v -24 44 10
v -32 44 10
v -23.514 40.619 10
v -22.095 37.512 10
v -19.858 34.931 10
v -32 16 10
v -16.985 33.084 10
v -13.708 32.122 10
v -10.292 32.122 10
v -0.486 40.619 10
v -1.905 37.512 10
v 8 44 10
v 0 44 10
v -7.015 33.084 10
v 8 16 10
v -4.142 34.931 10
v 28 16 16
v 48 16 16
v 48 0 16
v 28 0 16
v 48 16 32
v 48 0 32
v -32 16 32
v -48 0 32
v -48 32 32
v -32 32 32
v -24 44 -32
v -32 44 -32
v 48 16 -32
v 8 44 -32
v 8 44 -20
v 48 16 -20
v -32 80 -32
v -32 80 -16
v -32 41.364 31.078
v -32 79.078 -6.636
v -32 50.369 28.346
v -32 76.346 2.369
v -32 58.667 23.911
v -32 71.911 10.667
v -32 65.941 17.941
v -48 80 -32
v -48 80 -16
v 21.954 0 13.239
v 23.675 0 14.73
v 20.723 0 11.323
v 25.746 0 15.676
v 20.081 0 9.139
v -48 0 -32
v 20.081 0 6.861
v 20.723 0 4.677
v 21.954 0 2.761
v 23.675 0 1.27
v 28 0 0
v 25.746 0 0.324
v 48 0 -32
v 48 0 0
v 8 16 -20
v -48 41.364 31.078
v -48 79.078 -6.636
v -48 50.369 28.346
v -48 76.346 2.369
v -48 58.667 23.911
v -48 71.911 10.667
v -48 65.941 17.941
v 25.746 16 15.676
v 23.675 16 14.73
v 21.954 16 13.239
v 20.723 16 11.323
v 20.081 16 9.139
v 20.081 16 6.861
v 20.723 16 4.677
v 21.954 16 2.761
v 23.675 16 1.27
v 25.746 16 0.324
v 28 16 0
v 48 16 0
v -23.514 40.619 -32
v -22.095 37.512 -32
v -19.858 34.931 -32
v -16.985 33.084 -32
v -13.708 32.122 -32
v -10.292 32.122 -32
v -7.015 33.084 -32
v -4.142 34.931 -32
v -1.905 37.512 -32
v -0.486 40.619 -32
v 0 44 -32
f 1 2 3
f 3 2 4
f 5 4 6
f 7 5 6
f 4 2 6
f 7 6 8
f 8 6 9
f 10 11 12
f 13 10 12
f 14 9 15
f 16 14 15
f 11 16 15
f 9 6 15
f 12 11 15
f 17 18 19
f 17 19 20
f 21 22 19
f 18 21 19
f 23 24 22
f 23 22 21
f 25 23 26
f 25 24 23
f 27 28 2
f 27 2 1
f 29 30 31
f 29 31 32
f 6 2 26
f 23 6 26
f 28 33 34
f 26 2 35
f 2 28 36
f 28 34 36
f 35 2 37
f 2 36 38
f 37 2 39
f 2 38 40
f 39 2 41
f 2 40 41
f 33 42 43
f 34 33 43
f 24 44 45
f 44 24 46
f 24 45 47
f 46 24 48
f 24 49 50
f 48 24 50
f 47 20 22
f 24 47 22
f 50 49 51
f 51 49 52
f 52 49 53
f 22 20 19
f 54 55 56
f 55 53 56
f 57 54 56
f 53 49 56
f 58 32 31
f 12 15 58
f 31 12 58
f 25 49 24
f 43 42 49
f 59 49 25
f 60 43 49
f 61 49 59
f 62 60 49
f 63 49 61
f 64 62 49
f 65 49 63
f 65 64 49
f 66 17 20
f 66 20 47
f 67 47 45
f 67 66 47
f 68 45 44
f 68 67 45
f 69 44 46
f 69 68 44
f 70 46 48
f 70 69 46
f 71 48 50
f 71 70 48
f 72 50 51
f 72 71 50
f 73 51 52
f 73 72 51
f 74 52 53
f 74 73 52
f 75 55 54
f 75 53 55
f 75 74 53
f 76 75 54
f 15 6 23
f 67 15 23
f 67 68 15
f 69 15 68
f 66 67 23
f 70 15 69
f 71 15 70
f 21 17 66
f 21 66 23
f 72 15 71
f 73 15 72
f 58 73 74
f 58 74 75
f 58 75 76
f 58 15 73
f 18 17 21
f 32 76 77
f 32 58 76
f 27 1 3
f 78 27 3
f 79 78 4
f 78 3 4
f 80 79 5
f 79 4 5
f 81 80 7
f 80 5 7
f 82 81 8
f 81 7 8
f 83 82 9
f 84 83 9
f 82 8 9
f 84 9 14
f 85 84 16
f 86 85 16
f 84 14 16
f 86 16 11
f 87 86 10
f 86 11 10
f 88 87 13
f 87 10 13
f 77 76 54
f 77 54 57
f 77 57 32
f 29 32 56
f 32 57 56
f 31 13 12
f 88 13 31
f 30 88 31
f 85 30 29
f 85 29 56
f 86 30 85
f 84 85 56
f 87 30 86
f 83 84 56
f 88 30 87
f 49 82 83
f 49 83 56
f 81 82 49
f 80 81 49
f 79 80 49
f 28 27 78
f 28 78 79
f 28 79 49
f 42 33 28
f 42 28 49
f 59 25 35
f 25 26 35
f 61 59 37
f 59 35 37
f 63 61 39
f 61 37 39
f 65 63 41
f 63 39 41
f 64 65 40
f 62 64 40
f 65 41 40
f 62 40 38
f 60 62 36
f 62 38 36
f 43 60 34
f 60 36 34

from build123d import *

# Parameters (mm, degrees)
SKETCH1_W           = 96
SKETCH1_H           = 64
BOSS_EXTRUDE1_DEPTH = 16
SKETCH2_W           = 64
SKETCH2_H           = 64
BOSS_EXTRUDE2_DEPTH = 16
FILLET2_R           = 48
SKETCH3_W           = 40
SKETCH3_H           = 42
BOSS_EXTRUDE3_DEPTH = 28
SKETCH4_R           = 12
CUT_EXTRUDE1_DEPTH  = 103.313244499
CUT_EXTRUDE2_DEPTH  = 87.162636914
BOSS_EXTRUDE5_DEPTH = 12


with BuildPart() as part:
    # Sketch1 → Boss-Extrude1 (new body)
    with BuildSketch(Plane(origin=(0, 0, 0), x_dir=(1, 0, 0), z_dir=(0, 1, 0))):
        Rectangle(SKETCH1_W, SKETCH1_H)
    extrude(amount=BOSS_EXTRUDE1_DEPTH)

    # Sketch2 → Boss-Extrude2 (add)
    with BuildSketch(Plane.ZY.offset(48)):
        with Locations((0, 48)):
            Rectangle(SKETCH2_W, SKETCH2_H)
    extrude(amount=-BOSS_EXTRUDE2_DEPTH)

    # Fillet2
    fillet2_edges = [part.edges().sort_by_distance(p)[0] for p in [
        (-40, 80, 32),
    ]]
    fillet(fillet2_edges, radius=FILLET2_R)

    # Sketch3 → Boss-Extrude3 (add)
    with BuildSketch(Plane(origin=(0, 16, 0), x_dir=(1, 0, 0), z_dir=(0, 1, 0))):
        with Locations((-12, 11)):
            Rectangle(SKETCH3_W, SKETCH3_H)
    extrude(amount=BOSS_EXTRUDE3_DEPTH)

    # Sketch4 → Cut-Extrude1 (cut, through all)
    with BuildSketch(Plane.XY.offset(10)):
        with Locations((-12, 44)):
            Circle(SKETCH4_R)
    extrude(amount=-CUT_EXTRUDE1_DEPTH, mode=Mode.SUBTRACT)

    # Sketch6 → Cut-Extrude2 (cut, through all)
    with BuildSketch(Plane(origin=(0, 16, 0), x_dir=(1, 0, 0), z_dir=(0, 1, 0))):
        with BuildLine():
            Line((48, -16), (28, -16))
            ThreePointArc((28, -16), (20, -8), (28, 0))
            Line((28, 0), (48, 0))
            ThreePointArc((48, 0), (56, -8), (48, -16))
        make_face()
    extrude(amount=-CUT_EXTRUDE2_DEPTH, mode=Mode.SUBTRACT)

    # Sketch7 → Boss-Extrude5 (add)
    with BuildSketch(Plane(origin=(0, 0, -32), x_dir=(-1, 0, 0), z_dir=(0, 0, -1))):
        Polygon((-8, 44), (-48, 16), (-8, 16), align=None)
    extrude(amount=-BOSS_EXTRUDE5_DEPTH)


solid = part.part
